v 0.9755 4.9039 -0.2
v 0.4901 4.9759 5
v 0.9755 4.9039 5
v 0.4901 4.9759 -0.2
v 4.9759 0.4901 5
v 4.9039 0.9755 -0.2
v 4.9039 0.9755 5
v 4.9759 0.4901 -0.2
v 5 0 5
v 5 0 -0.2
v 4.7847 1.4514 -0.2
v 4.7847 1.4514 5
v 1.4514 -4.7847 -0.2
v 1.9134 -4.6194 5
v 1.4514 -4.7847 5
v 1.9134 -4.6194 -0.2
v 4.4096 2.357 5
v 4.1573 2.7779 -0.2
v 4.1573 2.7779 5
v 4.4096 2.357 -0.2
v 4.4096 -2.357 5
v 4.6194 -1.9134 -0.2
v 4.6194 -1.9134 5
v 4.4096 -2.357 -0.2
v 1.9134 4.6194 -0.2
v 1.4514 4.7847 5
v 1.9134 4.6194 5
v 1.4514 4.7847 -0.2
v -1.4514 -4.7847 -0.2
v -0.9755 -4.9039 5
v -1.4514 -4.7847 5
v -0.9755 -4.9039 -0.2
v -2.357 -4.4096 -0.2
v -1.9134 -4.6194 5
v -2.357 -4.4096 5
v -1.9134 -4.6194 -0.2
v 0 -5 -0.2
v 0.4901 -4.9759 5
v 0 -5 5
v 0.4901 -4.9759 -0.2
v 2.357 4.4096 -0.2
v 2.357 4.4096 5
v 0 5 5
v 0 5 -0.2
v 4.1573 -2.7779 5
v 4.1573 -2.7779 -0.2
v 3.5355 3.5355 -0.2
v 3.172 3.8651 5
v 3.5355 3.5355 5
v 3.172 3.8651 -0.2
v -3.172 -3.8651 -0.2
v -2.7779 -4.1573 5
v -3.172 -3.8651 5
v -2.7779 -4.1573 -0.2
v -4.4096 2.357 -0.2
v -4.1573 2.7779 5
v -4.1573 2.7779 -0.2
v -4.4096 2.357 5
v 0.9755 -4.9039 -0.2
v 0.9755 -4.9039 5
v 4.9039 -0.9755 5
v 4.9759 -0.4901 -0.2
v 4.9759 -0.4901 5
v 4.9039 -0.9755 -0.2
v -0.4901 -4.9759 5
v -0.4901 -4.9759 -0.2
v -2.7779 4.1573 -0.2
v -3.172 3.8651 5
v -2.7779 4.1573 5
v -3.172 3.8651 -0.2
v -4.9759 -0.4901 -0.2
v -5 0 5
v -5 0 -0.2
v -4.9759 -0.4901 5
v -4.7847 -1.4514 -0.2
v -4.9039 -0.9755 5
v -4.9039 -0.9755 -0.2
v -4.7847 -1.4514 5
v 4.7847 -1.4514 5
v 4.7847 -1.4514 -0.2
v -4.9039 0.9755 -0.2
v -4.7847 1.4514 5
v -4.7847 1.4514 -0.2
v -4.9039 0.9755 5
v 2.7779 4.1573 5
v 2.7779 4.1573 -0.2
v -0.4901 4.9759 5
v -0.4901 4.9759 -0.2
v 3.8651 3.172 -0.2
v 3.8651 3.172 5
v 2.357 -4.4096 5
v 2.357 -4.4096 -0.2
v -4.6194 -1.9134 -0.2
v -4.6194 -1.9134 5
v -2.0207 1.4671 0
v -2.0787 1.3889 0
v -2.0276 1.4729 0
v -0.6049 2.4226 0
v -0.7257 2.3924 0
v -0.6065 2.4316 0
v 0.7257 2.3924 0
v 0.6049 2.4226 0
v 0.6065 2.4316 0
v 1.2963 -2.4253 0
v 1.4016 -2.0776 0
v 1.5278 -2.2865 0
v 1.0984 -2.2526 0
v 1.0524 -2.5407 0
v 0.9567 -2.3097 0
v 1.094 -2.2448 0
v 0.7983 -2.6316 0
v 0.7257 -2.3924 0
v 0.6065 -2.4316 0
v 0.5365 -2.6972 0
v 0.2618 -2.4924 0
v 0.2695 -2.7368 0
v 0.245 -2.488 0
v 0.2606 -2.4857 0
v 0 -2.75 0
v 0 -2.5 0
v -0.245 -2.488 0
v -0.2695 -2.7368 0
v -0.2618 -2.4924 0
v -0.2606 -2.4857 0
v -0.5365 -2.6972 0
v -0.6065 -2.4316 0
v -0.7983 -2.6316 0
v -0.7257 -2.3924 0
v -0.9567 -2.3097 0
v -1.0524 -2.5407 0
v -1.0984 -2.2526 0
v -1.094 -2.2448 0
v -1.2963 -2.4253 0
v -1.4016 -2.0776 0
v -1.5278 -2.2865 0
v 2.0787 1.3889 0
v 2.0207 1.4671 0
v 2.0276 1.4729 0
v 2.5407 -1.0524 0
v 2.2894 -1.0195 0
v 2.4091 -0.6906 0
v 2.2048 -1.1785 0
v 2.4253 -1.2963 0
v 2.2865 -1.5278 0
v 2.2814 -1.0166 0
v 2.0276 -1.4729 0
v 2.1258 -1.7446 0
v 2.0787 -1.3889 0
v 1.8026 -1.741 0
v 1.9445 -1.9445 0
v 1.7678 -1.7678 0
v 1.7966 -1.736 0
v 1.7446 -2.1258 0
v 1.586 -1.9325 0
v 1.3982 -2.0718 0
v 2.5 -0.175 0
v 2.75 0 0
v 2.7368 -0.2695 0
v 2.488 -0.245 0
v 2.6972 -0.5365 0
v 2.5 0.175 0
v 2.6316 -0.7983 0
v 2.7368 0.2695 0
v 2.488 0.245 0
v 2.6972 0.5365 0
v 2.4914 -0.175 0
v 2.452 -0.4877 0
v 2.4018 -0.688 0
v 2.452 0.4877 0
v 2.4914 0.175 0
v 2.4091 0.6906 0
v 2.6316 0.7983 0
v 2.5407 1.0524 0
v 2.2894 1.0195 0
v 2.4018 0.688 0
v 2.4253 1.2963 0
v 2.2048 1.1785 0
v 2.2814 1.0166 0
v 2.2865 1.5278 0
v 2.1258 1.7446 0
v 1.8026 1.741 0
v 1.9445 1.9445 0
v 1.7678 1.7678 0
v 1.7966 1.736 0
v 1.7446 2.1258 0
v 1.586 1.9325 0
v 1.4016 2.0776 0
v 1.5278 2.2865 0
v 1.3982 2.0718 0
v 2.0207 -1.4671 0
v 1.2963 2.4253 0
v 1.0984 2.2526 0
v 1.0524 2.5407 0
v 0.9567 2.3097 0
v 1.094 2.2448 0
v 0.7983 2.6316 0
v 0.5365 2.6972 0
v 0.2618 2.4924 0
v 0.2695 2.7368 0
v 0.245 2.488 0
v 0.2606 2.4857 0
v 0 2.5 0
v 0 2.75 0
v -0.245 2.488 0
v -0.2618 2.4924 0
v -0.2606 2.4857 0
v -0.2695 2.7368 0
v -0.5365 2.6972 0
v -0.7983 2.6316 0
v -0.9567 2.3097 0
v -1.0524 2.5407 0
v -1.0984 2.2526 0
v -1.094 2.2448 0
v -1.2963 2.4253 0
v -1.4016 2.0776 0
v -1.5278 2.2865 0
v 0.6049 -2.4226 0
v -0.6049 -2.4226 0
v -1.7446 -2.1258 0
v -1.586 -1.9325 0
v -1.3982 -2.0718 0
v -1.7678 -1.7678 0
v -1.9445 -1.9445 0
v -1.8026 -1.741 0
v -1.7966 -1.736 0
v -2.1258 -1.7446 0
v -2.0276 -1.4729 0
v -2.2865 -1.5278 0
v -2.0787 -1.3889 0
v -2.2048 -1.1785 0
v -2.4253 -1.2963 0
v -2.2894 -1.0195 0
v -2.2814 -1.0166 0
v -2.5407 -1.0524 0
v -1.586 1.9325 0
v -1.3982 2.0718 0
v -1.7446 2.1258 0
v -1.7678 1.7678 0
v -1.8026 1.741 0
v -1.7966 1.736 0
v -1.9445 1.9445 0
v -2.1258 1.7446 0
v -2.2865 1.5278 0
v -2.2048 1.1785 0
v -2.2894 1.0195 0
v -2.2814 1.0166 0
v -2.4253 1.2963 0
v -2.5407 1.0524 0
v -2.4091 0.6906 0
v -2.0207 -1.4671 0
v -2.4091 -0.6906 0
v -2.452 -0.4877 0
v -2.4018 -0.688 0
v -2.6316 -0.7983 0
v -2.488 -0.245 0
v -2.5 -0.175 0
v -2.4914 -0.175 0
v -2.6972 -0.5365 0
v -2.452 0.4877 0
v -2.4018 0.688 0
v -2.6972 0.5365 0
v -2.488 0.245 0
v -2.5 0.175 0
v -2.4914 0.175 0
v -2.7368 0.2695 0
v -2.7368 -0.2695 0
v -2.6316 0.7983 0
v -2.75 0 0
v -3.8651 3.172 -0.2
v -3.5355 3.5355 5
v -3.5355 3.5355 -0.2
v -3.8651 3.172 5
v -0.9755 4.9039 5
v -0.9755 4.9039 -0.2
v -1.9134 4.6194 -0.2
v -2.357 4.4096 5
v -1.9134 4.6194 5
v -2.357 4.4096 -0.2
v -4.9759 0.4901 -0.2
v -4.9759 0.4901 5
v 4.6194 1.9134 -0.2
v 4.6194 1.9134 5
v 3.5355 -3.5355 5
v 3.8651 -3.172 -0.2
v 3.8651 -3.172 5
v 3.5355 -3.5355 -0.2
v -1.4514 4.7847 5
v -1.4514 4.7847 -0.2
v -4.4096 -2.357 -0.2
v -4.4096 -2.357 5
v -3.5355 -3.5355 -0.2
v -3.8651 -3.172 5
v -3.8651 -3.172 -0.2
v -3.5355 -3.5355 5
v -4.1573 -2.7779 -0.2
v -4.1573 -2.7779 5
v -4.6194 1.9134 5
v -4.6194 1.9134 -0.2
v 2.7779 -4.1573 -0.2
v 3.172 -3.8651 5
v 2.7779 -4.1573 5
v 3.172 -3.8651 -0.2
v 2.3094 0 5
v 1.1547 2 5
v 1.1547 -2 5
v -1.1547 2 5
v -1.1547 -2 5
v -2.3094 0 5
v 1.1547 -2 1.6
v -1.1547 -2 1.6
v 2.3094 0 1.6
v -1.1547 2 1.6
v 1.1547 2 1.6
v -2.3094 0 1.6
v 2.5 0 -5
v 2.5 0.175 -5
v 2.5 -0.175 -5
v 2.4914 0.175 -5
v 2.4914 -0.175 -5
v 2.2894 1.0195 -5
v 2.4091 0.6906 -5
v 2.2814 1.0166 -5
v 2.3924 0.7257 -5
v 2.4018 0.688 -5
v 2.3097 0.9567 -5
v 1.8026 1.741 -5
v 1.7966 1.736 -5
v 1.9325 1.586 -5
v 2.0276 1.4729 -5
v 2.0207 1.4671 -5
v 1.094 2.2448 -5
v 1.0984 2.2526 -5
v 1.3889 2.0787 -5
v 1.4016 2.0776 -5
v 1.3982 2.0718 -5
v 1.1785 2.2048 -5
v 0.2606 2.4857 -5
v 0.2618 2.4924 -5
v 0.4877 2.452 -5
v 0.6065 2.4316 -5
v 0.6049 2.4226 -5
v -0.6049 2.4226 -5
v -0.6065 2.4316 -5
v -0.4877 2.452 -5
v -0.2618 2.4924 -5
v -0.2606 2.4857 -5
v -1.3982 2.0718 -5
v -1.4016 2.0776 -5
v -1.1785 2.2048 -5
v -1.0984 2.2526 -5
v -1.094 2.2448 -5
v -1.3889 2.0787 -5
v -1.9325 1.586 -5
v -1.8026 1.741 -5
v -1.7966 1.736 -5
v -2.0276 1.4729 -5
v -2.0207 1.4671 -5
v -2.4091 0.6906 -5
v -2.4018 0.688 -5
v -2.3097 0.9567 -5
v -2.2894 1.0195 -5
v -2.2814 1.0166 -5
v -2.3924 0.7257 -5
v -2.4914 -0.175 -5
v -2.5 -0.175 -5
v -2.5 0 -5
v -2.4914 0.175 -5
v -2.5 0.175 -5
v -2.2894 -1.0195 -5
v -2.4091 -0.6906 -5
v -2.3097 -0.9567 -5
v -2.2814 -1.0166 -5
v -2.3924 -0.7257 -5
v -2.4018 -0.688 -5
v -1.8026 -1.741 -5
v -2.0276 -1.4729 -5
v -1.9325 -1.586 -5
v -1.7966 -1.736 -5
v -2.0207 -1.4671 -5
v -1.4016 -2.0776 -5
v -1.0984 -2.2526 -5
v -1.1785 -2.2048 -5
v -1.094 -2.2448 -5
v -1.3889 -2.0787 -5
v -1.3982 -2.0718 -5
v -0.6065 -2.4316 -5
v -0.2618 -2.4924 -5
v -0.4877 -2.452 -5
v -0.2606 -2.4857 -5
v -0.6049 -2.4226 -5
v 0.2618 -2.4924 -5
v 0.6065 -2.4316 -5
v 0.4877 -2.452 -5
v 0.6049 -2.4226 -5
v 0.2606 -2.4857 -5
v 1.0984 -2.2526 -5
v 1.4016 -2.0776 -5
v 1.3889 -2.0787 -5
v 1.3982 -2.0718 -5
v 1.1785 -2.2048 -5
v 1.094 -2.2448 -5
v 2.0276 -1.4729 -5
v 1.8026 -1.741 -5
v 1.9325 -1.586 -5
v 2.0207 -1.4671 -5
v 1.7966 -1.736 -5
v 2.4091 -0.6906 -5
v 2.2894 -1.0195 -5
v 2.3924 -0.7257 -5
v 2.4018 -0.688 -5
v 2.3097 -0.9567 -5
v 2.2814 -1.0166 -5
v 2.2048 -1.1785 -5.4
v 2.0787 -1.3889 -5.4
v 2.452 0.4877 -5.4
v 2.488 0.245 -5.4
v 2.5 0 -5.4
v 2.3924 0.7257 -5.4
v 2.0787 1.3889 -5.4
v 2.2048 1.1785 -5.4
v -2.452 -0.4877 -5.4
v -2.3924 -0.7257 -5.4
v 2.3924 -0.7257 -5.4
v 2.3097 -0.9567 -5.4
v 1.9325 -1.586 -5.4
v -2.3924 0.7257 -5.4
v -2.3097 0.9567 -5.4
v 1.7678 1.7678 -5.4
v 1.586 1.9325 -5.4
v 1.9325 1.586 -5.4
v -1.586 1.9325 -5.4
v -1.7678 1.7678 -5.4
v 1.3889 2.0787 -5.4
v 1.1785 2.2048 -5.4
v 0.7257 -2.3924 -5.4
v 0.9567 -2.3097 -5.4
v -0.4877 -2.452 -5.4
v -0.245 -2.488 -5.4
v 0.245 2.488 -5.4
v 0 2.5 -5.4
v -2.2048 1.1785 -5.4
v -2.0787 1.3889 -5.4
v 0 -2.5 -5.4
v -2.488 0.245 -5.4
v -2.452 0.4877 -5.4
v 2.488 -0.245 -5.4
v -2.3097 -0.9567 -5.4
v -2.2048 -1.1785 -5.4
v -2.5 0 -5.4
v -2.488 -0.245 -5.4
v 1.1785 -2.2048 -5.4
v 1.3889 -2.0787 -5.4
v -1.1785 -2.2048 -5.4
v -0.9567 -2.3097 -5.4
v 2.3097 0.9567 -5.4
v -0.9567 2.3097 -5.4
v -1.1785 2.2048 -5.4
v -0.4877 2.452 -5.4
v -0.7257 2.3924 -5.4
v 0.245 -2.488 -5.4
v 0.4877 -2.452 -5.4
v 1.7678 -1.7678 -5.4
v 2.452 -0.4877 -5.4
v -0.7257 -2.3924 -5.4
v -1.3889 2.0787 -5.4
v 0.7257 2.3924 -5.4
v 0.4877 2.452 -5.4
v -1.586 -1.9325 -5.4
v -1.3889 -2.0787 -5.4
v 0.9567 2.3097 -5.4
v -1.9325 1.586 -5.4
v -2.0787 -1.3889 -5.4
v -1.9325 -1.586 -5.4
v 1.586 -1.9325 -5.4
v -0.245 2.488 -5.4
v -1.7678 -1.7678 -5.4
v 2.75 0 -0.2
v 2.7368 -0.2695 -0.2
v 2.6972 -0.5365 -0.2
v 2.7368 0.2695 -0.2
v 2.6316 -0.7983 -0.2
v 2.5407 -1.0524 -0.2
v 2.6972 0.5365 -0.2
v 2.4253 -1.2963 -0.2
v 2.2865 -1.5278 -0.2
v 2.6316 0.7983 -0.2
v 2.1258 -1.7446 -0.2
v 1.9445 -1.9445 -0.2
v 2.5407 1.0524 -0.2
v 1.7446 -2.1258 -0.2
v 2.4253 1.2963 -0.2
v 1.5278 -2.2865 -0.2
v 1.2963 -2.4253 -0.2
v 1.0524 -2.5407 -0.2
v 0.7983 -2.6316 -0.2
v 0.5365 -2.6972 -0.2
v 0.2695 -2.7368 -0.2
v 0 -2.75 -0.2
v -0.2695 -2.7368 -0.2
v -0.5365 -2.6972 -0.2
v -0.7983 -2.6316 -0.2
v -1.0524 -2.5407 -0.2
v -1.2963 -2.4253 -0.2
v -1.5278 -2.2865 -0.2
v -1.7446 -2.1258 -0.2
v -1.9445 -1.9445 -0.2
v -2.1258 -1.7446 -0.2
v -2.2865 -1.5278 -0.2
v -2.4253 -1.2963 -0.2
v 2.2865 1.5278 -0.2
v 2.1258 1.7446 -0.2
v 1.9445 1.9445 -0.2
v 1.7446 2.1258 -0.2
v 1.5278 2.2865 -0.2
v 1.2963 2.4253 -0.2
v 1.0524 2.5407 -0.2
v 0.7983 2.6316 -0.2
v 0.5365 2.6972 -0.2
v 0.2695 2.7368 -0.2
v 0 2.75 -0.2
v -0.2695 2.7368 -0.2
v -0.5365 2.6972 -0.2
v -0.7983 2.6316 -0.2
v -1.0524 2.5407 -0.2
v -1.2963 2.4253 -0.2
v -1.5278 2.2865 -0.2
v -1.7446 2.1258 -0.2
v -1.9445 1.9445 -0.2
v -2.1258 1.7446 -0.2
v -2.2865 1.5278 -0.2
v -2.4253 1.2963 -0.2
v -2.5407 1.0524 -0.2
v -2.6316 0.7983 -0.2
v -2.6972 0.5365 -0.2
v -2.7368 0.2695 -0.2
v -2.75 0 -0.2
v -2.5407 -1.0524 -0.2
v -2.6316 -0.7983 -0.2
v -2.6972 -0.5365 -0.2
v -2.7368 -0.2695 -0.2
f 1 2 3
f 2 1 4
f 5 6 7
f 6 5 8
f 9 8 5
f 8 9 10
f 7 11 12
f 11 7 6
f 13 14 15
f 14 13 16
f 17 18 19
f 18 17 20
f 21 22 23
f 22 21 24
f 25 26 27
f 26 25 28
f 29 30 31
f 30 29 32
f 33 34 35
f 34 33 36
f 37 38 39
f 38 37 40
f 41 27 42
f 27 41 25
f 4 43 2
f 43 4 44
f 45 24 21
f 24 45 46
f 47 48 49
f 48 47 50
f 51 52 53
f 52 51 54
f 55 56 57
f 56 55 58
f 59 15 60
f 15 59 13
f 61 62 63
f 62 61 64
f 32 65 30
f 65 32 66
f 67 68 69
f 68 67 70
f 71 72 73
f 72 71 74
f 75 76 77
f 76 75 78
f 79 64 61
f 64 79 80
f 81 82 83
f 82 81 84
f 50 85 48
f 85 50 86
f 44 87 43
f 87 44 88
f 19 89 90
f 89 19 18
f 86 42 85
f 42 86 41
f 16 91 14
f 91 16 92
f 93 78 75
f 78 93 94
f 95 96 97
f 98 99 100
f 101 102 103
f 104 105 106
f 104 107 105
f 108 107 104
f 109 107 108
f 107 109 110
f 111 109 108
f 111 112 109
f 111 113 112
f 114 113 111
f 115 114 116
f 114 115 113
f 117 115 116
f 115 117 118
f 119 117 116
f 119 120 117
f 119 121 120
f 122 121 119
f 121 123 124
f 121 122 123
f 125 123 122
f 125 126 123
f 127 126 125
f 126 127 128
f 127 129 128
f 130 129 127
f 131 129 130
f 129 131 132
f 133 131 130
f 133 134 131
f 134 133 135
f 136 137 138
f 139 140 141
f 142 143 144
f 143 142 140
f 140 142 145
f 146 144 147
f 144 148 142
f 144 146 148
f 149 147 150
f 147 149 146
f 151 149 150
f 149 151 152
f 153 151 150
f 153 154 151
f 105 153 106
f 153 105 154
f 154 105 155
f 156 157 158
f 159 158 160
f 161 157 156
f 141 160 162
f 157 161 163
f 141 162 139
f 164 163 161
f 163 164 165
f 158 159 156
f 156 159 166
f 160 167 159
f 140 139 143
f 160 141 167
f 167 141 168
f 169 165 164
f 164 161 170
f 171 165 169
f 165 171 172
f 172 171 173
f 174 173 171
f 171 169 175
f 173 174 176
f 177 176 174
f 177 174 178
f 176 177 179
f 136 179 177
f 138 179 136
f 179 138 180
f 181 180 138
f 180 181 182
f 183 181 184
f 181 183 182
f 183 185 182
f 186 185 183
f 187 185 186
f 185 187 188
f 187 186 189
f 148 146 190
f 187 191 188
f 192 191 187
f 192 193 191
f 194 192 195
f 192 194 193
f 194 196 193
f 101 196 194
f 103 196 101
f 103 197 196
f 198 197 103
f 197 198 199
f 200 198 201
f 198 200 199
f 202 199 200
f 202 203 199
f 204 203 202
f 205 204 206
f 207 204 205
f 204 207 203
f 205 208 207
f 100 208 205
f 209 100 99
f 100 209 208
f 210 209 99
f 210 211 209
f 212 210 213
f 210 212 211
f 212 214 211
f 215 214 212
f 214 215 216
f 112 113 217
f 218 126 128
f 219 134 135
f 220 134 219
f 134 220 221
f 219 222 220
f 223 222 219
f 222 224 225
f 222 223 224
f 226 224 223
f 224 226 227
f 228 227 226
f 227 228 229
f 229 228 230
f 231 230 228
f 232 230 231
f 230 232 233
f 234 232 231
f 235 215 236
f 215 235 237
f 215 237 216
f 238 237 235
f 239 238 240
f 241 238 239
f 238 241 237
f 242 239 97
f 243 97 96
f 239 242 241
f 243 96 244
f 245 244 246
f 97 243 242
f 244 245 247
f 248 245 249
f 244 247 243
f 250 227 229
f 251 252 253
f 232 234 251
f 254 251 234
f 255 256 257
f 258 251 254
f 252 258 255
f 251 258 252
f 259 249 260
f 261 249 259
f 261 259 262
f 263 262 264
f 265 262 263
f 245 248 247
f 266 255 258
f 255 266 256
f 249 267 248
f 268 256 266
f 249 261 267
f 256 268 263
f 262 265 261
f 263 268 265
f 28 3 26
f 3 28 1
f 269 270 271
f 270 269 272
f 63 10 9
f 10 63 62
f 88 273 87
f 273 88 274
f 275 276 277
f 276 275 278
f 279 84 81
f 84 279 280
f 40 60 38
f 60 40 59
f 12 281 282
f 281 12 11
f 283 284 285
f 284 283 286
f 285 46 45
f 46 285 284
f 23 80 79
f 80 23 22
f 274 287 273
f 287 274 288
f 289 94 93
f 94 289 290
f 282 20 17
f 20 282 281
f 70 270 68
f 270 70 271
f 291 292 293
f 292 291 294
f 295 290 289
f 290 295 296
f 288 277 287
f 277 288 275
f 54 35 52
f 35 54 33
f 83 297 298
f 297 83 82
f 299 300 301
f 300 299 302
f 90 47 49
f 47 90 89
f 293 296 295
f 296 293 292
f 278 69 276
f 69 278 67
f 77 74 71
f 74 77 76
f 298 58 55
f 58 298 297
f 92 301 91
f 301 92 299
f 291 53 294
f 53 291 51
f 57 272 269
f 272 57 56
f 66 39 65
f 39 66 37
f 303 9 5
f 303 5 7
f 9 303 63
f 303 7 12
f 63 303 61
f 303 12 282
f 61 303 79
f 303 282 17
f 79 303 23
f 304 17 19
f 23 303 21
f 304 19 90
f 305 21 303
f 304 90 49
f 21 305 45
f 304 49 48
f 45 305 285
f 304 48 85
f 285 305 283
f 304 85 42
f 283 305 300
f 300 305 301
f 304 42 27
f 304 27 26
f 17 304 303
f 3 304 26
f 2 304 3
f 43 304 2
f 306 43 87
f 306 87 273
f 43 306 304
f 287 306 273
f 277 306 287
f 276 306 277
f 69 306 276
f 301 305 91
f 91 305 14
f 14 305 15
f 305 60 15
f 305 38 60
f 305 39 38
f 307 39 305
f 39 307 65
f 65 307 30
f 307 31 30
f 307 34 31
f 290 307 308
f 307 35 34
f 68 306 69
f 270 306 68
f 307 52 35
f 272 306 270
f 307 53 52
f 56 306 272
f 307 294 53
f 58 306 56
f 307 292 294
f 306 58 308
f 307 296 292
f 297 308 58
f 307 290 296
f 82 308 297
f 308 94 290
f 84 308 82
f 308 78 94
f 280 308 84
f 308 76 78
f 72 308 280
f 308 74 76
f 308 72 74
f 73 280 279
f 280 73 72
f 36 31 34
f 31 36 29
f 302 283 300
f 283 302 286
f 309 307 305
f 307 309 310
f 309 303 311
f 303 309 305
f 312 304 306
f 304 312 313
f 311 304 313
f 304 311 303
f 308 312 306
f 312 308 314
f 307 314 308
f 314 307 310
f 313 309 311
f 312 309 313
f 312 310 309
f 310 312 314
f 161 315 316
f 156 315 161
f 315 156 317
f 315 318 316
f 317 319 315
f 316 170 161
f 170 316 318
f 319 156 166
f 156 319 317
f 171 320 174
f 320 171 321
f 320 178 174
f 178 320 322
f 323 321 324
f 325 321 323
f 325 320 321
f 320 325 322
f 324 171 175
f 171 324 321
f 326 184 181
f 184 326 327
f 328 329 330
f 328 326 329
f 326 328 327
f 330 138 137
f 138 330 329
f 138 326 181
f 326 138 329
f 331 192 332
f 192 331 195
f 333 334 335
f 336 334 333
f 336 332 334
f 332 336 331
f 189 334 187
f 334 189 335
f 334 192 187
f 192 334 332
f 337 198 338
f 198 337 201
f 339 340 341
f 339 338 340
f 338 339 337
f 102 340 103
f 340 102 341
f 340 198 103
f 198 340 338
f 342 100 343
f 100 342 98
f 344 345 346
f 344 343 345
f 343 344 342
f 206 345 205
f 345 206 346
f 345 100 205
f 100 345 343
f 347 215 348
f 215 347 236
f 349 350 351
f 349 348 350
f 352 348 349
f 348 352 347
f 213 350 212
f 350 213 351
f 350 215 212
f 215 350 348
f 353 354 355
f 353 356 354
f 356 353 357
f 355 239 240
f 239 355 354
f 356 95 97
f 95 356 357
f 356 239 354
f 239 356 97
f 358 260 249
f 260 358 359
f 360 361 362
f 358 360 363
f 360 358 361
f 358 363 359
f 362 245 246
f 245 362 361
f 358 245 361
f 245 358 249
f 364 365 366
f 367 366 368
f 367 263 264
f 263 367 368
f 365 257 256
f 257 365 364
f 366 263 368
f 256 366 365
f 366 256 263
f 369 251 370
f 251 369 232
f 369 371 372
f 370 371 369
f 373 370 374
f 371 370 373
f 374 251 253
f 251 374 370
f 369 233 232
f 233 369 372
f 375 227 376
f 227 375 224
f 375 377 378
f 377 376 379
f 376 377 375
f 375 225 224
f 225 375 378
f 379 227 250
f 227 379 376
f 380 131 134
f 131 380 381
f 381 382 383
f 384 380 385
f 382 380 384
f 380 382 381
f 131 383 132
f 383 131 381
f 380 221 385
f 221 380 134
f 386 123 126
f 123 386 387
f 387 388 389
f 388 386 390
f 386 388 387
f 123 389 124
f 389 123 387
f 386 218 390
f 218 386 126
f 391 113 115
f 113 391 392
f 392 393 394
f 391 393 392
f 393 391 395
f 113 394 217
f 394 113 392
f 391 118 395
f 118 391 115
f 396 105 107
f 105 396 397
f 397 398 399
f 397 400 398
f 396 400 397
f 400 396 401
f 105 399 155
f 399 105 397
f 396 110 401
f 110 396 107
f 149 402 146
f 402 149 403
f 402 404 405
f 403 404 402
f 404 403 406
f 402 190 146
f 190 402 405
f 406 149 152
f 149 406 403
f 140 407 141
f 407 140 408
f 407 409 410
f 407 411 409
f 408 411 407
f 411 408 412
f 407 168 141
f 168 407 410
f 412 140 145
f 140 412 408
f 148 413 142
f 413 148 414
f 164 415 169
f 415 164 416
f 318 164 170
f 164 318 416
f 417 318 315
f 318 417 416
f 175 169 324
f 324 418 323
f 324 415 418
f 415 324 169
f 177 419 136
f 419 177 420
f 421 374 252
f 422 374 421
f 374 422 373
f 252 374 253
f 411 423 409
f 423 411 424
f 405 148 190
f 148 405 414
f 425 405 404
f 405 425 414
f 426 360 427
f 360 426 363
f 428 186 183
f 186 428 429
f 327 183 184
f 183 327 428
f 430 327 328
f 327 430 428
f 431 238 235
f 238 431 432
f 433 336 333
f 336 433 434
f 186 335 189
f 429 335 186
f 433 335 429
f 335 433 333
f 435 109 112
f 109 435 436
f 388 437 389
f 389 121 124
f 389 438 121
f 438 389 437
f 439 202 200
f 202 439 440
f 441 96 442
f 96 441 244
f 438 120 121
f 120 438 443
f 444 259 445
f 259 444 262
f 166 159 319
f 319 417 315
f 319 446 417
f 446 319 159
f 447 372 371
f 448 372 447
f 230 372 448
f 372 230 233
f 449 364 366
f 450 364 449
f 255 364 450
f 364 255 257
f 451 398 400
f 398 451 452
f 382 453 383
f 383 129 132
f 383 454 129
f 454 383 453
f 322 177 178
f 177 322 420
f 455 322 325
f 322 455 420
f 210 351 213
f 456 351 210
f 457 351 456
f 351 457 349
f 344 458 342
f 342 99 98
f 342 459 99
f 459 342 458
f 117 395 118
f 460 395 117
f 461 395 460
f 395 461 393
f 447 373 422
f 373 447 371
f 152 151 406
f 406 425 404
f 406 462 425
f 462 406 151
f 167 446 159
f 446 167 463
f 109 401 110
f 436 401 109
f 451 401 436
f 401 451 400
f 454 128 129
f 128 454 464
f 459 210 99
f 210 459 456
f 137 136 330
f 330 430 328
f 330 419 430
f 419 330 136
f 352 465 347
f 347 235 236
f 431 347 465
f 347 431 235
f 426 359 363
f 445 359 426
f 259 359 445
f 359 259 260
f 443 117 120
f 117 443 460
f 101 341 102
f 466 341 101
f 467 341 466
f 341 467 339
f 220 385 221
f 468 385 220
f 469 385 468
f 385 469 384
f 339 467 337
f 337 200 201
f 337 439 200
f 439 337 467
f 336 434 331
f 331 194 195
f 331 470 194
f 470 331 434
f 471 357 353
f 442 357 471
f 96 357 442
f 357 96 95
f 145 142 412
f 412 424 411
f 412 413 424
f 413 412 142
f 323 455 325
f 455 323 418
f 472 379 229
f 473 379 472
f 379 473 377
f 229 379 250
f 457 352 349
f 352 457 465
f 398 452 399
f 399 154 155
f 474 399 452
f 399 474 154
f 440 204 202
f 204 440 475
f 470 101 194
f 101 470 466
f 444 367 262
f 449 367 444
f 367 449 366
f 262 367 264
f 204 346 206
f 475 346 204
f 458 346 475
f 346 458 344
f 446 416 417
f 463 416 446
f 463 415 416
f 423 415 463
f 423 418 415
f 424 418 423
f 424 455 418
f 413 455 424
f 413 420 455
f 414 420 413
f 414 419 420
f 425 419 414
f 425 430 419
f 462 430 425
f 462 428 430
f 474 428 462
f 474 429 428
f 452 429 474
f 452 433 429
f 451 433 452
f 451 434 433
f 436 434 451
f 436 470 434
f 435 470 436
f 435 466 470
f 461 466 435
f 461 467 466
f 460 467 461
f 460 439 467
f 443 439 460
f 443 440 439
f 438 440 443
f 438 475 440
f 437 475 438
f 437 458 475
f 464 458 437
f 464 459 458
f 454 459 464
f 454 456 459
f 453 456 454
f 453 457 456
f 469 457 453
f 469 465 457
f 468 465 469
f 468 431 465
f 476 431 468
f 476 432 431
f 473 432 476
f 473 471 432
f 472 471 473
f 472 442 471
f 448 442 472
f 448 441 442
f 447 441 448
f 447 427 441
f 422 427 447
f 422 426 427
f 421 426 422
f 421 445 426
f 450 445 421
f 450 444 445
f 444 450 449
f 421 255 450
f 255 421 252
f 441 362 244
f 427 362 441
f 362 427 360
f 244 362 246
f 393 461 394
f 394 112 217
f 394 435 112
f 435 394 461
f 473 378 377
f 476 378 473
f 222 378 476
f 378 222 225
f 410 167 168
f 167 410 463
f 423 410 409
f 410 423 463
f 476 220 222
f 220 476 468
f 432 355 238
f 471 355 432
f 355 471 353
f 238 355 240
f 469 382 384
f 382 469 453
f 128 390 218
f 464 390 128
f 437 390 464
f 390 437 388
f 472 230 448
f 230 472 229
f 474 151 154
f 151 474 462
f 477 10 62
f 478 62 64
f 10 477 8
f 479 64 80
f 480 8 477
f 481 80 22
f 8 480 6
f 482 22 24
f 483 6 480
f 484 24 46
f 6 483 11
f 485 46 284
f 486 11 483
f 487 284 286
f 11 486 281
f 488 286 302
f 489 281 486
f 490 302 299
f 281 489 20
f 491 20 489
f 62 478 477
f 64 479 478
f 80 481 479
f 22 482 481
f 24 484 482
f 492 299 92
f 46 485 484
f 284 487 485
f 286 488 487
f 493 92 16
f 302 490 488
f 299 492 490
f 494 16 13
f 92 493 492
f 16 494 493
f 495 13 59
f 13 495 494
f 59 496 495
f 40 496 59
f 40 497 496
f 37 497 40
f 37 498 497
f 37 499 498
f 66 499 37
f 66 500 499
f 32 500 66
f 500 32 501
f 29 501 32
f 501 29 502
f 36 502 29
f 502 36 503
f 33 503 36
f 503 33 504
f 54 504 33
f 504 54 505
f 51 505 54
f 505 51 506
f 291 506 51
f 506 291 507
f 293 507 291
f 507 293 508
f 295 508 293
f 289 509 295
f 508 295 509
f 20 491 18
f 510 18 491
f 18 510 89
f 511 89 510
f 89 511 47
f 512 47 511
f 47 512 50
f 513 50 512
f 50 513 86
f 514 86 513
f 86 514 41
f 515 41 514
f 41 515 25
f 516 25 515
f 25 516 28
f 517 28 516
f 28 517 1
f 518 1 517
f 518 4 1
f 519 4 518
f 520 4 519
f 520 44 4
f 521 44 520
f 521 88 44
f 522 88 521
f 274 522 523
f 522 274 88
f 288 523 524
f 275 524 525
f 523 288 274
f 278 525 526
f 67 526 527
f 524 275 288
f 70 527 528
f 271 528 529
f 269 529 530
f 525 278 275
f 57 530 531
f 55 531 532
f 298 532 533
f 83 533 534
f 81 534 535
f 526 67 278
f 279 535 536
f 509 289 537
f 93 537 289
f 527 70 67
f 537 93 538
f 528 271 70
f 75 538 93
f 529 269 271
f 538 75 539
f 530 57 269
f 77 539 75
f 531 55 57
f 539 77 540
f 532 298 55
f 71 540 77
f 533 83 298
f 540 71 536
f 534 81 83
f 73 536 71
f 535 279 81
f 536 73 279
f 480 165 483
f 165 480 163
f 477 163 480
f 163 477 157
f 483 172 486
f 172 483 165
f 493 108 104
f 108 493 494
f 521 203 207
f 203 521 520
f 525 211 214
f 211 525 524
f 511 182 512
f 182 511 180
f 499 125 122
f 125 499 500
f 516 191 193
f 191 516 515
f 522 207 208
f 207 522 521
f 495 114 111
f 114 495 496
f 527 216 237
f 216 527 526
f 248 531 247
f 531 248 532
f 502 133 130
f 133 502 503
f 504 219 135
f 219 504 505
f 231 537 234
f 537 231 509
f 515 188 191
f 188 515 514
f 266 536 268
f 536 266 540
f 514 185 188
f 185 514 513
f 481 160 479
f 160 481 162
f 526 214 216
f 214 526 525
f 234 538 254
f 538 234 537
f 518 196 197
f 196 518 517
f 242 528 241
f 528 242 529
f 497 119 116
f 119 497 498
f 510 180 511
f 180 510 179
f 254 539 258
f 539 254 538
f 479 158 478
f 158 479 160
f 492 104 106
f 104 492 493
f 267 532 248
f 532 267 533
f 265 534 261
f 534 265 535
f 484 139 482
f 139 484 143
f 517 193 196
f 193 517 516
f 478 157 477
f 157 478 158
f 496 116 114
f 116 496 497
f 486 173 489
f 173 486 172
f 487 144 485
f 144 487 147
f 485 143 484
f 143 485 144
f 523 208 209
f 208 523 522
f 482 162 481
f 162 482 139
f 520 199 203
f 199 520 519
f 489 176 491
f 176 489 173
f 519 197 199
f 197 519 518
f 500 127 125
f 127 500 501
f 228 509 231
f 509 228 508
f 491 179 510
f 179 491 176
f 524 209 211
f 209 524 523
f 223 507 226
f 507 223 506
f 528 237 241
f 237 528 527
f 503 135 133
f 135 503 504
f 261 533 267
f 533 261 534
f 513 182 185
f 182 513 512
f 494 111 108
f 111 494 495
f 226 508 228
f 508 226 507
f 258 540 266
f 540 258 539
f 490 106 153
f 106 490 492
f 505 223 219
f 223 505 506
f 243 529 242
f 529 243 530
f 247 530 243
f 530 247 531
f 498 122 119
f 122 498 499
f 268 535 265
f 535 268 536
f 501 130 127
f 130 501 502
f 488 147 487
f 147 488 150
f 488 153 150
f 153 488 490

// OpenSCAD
// Parameters
shaft_diameter_mm = 5.0; //[2.5:10.0:0.1]
head_diameter_mm = 10.0; //[5.0:20.0:0.1]
length_mm = 10.0; //[5.0:30.0:0.5]
head_height_mm = 5.0; //[2.5:10.0:0.1]
socket_af_mm = 4.0; //[2.0:8.0:0.1]
socket_depth_mm = 3.0; //[1.5:6.0:0.1]
thread_major_diameter_mm = 5.0; //[2.5:10.0:0.1]
thread_pitch_mm = 0.8; //[0.4:1.6:0.05]
thread_ridge_height_mm = 0.25; //[0.1:0.6:0.05]
thread_ridge_width_mm = 0.35; //[0.15:0.8:0.05]
thread_ridge_count = 18; //[6:60:1]
washer_outer_diameter_mm = 10.0; //[6.0:20.0:0.1]
washer_thickness_mm = 1.0; //[0.5:3.0:0.1]
washer_hole_diameter_mm = 5.5; //[3.0:12.0:0.1]
overlap_mm = 0.8; //[0.2:2.0:0.1]

// Screw and Washer - complete geometry
module screw_and_washer() {
  color("DimGray") {
    // Socket Head Cap
    difference() {
      translate([0, 0, length_mm/2 - head_height_mm/2])
        cylinder(r=head_diameter_mm/2, h=head_height_mm, center=true, $fn=64);
      translate([0, 0, length_mm/2 - socket_depth_mm/2])
        rotate([0, 0, 0])
        cylinder(r=socket_af_mm/(2*cos(30)), h=socket_depth_mm + overlap_mm, center=true, $fn=6);
    }
    
    // Shaft with Threads
    union() {
      translate([0, 0, -(length_mm - head_height_mm)/2])
        cylinder(r=shaft_diameter_mm/2, h=length_mm - head_height_mm + overlap_mm, center=true, $fn=64);
      for (i = [0:thread_ridge_count-1]) {
        rotate([0, 0, i*360/thread_ridge_count])
          translate([thread_major_diameter_mm/2 - thread_ridge_height_mm/2, 0, -(length_mm - head_height_mm)/2])
          cube([thread_ridge_height_mm, thread_ridge_width_mm, length_mm - head_height_mm], center=true);
      }
    }
  }
  
  // Washer
  color("Silver") {
    difference() {
      translate([0, 0, length_mm/2 - head_height_mm - washer_thickness_mm/2 + overlap_mm])
        cylinder(r=washer_outer_diameter_mm/2, h=washer_thickness_mm, center=true, $fn=64);
      translate([0, 0, length_mm/2 - head_height_mm - washer_thickness_mm/2 + overlap_mm])
        cylinder(r=washer_hole_diameter_mm/2, h=washer_thickness_mm + 2*overlap_mm, center=true, $fn=64);
    }
  }
}

// Assembly
module assembly() {
  screw_and_washer();
}

assembly();
